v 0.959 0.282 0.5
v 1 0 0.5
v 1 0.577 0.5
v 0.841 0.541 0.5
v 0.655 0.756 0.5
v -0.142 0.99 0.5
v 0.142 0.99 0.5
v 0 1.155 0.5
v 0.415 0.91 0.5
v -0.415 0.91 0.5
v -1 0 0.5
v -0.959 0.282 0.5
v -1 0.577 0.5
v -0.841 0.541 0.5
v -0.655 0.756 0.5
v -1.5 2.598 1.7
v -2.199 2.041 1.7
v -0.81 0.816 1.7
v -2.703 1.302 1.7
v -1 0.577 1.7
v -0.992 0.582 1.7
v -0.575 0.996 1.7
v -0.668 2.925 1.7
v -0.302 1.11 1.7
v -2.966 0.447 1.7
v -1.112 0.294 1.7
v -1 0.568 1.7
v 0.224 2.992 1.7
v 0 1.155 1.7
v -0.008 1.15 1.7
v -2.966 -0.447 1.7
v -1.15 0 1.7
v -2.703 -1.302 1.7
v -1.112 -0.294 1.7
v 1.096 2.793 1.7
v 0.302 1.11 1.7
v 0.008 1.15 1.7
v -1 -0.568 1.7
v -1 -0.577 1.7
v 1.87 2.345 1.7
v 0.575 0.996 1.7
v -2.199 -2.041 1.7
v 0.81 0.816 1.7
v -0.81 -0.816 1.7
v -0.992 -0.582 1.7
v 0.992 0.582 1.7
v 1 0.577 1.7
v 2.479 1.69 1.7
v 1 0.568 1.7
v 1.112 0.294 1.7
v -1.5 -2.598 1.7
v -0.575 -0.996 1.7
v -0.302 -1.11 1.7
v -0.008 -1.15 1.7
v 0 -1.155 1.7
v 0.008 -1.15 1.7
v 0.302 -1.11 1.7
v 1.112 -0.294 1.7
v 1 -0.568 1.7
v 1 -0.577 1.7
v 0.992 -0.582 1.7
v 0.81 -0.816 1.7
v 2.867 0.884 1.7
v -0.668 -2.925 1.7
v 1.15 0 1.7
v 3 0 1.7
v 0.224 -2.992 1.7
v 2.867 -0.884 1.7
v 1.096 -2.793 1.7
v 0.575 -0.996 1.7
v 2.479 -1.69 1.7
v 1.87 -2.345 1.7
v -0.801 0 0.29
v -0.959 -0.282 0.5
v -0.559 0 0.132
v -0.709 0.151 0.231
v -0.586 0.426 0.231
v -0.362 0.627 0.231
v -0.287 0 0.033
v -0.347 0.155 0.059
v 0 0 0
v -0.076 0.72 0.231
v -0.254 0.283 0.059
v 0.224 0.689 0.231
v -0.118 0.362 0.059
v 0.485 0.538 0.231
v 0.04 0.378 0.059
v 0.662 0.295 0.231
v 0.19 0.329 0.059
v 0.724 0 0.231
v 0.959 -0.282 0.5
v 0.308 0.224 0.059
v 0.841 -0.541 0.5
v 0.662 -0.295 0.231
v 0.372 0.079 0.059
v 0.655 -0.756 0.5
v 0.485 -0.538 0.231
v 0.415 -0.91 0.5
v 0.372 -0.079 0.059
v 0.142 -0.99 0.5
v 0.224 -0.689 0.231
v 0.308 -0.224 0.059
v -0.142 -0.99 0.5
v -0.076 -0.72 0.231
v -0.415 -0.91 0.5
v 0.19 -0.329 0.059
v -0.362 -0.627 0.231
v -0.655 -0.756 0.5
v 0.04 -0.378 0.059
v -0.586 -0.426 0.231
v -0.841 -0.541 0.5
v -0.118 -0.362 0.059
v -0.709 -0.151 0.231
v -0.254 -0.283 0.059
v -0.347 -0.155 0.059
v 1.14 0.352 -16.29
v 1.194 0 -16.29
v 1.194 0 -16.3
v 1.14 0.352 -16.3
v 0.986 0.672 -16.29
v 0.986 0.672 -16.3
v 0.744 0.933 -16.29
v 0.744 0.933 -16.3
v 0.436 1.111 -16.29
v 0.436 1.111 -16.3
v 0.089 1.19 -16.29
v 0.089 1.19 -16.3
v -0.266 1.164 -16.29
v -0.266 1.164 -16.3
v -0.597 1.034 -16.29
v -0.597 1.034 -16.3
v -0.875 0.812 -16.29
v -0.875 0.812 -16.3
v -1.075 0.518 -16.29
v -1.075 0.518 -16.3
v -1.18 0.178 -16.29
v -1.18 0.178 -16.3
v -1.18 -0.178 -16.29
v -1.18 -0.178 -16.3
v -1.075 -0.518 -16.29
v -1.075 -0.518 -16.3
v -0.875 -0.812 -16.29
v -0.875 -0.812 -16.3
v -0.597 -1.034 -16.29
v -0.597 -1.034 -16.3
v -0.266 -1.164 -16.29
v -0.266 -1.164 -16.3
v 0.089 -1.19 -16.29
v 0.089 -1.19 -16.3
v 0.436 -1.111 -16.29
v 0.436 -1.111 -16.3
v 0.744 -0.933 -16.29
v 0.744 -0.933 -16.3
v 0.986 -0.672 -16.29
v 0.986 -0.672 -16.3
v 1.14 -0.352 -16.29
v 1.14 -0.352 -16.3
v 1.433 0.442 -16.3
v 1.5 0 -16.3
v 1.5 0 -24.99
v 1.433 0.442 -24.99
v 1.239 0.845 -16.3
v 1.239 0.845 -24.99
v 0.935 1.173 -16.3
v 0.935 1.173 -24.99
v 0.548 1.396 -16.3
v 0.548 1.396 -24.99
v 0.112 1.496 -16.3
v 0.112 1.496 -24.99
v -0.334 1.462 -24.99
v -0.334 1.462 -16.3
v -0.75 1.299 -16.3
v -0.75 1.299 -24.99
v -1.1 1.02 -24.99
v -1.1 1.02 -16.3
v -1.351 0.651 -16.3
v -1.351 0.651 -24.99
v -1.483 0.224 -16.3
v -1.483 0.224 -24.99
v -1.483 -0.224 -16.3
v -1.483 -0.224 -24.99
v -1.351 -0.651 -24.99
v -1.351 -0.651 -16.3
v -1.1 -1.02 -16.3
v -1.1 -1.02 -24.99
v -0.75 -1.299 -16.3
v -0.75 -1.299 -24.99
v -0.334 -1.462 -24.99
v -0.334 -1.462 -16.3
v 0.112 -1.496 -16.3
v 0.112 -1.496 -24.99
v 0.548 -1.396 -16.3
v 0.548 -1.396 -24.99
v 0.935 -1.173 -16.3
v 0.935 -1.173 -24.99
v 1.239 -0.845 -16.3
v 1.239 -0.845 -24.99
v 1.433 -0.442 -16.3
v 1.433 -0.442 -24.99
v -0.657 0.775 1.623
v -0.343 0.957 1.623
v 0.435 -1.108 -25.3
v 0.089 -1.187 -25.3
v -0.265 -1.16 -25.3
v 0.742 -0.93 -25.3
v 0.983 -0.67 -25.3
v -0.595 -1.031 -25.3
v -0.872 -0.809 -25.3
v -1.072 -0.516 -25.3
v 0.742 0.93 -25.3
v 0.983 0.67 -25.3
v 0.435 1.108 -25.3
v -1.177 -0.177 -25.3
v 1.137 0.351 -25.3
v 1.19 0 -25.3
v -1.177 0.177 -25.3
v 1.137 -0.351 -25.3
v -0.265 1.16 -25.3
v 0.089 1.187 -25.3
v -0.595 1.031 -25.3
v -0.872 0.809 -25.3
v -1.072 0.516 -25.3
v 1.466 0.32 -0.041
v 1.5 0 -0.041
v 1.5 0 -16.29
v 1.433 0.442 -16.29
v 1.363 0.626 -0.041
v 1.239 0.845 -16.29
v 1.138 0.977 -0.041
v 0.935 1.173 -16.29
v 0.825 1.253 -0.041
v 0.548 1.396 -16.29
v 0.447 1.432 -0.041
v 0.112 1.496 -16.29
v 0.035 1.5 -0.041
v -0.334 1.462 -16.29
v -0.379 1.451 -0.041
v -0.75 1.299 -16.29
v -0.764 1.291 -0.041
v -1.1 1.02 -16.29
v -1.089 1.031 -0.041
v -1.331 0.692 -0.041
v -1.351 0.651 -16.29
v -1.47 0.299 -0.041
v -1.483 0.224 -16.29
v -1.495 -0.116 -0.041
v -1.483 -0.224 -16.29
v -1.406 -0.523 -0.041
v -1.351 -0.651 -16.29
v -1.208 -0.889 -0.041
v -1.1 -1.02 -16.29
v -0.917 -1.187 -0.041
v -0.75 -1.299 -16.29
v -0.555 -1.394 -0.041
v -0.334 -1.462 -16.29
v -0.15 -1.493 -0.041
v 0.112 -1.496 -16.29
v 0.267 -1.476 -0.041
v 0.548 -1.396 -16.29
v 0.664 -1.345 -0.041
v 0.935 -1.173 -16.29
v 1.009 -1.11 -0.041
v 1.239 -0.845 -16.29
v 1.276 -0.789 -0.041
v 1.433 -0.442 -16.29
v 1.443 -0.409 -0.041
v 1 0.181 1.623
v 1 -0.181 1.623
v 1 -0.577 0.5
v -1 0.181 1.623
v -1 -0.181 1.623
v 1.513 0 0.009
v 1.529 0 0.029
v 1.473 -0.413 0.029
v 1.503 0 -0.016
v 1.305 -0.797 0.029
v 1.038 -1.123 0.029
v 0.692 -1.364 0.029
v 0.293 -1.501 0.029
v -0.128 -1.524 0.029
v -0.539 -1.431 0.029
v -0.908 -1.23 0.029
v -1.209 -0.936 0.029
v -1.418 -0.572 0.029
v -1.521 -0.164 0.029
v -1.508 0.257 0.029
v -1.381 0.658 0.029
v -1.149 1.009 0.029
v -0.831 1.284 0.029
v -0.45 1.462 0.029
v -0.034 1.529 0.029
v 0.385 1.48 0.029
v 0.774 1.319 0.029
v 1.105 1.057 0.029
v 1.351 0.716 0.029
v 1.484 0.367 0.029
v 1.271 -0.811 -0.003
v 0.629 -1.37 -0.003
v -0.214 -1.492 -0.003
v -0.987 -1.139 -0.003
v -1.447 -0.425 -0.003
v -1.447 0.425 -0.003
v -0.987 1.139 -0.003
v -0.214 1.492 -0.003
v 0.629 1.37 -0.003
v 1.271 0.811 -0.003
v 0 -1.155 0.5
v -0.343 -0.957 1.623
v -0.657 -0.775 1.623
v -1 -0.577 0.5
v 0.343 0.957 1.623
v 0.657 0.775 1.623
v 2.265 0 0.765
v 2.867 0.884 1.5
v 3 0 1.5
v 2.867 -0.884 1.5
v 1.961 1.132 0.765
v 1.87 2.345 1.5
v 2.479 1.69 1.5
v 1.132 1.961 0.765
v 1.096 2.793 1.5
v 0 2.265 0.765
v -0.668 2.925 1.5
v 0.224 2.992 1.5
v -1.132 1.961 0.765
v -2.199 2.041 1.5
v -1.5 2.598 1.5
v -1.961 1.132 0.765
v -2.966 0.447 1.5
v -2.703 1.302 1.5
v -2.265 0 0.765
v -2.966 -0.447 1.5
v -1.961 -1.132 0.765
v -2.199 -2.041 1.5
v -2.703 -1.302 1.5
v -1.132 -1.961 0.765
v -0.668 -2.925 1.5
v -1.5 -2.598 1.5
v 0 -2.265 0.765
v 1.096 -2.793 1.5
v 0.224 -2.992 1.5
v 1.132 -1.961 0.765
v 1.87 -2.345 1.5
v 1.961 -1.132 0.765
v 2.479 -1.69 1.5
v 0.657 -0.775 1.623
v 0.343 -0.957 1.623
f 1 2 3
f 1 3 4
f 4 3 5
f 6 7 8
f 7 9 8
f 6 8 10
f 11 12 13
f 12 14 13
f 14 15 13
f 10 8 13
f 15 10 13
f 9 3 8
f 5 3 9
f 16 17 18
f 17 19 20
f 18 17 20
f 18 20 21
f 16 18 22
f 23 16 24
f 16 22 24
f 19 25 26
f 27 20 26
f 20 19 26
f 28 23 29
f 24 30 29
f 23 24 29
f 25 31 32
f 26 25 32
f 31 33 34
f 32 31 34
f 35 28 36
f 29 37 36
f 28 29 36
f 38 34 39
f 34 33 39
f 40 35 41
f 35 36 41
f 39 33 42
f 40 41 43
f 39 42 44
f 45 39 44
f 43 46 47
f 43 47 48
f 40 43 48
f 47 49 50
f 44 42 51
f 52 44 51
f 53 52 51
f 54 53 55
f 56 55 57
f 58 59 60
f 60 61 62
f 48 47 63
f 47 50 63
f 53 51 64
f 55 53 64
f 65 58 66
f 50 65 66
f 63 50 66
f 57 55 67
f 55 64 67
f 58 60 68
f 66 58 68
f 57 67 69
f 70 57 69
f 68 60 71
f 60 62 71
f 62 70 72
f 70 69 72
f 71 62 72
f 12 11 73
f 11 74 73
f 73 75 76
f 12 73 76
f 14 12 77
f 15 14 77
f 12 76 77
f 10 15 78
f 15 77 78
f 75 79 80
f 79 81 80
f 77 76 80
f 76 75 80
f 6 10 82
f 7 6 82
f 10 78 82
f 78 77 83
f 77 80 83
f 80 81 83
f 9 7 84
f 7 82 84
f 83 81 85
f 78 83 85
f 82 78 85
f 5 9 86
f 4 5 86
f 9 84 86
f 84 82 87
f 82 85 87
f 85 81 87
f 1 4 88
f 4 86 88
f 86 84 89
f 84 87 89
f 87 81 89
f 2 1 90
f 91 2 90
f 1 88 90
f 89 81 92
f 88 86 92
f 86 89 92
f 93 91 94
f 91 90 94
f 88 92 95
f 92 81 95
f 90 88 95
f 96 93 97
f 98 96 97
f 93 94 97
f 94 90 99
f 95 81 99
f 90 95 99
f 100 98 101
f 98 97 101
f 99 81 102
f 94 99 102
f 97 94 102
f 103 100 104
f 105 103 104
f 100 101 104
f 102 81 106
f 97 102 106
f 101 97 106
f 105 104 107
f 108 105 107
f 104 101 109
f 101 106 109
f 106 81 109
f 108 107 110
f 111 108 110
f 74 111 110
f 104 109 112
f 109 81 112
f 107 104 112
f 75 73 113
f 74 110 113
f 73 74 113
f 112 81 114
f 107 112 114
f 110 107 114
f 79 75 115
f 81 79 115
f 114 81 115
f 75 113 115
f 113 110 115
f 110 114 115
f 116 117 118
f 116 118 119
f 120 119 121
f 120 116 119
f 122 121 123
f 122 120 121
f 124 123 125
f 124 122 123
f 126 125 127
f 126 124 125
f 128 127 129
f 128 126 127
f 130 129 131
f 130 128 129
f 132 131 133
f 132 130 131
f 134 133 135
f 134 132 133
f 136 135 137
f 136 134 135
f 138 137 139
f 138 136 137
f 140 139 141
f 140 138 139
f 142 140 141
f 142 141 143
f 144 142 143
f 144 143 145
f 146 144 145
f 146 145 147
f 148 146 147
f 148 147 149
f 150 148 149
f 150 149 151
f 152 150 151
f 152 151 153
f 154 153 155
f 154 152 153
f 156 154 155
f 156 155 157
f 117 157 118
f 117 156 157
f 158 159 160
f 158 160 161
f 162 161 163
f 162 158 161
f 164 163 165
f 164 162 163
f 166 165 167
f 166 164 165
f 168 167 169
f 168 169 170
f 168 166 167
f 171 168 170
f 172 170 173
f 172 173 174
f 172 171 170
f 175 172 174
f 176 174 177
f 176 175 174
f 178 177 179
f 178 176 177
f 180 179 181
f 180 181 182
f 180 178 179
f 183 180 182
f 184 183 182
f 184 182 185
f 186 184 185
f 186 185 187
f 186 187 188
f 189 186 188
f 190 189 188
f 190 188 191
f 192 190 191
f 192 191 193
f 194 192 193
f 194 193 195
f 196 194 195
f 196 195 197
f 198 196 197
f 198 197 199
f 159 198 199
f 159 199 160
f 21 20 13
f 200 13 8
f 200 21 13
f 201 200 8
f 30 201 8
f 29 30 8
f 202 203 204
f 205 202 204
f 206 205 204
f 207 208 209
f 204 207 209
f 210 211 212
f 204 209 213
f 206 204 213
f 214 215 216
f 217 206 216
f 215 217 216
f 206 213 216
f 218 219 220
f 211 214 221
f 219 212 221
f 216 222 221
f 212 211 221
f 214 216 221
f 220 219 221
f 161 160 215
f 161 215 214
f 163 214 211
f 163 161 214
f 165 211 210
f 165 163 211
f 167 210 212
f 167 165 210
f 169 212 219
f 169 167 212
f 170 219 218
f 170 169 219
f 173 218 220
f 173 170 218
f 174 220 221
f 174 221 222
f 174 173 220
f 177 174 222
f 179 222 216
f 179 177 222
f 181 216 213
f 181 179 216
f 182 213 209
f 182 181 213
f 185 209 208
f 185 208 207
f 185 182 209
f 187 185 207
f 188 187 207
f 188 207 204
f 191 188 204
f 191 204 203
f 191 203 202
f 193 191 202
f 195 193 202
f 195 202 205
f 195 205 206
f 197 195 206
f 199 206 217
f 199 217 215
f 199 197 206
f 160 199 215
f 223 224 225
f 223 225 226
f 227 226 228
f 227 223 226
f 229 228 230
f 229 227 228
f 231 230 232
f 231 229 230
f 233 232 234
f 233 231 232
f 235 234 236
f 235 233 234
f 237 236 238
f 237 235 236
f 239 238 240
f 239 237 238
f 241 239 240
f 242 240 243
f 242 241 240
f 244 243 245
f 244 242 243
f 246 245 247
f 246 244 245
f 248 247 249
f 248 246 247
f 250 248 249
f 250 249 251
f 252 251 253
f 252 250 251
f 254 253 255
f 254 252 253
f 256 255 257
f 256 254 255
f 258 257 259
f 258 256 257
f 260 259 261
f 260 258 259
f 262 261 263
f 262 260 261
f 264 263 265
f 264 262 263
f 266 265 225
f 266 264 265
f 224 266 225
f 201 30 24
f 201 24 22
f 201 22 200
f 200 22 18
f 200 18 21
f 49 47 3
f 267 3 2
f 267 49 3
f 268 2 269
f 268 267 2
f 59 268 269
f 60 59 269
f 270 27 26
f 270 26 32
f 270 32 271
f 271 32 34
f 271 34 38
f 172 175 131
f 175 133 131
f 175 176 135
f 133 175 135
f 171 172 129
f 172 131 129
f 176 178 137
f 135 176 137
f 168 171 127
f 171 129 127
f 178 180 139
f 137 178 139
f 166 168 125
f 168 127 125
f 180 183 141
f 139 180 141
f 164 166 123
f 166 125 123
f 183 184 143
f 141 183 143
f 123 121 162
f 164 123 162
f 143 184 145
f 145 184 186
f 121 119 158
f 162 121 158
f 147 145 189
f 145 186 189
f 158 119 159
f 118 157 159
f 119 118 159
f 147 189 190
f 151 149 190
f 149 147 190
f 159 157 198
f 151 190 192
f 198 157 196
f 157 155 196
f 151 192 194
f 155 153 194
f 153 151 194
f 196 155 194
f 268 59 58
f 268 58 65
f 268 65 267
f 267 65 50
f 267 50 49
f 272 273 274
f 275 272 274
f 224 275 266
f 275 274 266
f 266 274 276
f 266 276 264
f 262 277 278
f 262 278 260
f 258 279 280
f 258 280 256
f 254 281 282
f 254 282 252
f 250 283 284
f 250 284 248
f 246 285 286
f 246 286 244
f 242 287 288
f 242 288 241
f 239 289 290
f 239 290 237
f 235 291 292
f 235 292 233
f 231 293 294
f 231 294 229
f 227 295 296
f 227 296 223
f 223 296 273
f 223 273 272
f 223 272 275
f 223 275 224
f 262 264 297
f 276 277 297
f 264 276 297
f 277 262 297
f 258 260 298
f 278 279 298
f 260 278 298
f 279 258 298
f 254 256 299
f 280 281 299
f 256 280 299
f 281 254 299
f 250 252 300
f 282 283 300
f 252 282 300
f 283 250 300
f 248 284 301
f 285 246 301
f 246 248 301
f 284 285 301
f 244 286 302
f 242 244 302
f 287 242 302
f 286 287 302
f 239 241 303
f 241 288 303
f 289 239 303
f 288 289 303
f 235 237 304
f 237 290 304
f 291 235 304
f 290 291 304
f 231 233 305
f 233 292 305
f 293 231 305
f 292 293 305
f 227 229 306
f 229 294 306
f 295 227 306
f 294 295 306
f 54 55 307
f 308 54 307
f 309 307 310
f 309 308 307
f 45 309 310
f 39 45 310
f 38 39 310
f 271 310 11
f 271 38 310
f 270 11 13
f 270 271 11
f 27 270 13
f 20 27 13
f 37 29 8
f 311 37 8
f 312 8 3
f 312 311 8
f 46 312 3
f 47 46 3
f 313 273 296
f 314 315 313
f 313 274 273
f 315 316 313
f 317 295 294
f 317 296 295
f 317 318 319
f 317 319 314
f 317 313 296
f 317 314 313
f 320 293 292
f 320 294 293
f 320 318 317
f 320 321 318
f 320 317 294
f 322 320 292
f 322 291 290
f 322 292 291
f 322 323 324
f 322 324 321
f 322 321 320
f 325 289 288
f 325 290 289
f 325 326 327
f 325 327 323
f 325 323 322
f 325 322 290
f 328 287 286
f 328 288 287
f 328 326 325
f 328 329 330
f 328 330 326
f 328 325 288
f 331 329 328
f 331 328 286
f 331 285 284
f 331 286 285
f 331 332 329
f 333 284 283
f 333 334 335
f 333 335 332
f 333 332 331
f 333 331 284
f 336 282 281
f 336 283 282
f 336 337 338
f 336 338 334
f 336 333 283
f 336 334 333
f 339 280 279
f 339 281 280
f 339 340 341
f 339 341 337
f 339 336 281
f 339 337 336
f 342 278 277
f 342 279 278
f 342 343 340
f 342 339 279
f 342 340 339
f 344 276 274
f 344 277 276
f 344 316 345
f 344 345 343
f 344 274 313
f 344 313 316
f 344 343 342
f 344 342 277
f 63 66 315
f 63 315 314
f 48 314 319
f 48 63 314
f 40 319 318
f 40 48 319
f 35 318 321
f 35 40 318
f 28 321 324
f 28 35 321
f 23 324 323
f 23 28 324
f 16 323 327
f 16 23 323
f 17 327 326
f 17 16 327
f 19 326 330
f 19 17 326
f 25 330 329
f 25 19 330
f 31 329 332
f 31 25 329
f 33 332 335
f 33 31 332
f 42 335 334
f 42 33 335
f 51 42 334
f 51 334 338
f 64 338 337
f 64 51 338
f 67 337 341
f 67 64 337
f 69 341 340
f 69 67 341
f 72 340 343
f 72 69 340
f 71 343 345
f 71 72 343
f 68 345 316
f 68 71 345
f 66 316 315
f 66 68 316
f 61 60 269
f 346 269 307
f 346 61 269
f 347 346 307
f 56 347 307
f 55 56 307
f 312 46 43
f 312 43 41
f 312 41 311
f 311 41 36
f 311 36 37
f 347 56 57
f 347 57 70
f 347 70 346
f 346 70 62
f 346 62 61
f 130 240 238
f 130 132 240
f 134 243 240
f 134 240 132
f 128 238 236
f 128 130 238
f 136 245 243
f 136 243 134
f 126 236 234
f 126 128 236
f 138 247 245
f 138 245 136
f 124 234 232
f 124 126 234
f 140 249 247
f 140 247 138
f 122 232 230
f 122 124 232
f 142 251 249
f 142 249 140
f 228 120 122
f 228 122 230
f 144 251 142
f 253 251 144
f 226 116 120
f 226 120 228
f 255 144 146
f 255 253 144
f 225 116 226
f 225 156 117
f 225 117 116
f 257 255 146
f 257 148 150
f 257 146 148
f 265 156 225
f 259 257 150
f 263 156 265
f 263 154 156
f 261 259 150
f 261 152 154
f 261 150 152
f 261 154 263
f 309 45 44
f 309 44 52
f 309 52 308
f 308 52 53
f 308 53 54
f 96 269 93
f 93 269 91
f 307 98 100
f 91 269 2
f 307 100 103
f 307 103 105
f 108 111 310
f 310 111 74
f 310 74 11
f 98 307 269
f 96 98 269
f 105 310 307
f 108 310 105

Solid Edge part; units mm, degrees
sketch "Sketch1" plane through (0, 0, 0) normal (0, -1, 0) x (1, 0, 0)
  line L0 (1.5, 0) -> (3, 1.5)
  line L1 (3, 1.5) -> (3, 1.7)
  line L2 (3, 1.7) -> (0, 1.7)
  line L3 (0, 1.7) -> (0, -28.3)
  line L4 (0, -28.3) -> (1.1935, -28.3)
  line L5 (1.1935, -28.3) -> (1.5, -27.9935)
  line L6 (1.5, -27.9935) -> (1.5, -16.3)
  line L7 (1.5, -16.3) -> (1.1935, -16.3)
  line L8 (1.1935, -16.3) -> (1.1935, -16.29)
  line L9 (1.1935, -16.29) -> (1.5, -16.29)
  line L10 (1.5, -16.29) -> (1.5, 0)
  dimension "D1" = 3
  dimension "D2" = 1.7
  dimension "D3" = 0.01
  dimension "D4" = 1.1935
  dimension "D5" = 18
  dimension "D6" = 0.2
revolve "RevolvedProtrusion1" add sketch "Sketch1" angle 360 about axis through (0, 0, 54) along (0, 0, -1)
sketch "Sketch2" plane through (0, 0, 0) normal (0, -1, 0) x (1, 0, 0)
  arc A0 (-1, 0.5) -> (0, 0) centre (0, 1.25) ccw
  line L0 (0, 0.5) -> (0, 0)
  line L1 (-1, 0.5) -> (0, 0.5)
  dimension "D1" = 28.8
revolve "RevolvedCutout1" cut sketch "Sketch2" angle 360 about axis through (0, 0, 54) along (0, 0, -1)
sketch "Sketch3" plane through (0, 0, 1.7) normal (0, 0, 1) x (0, -1, 0)
  line L0 (-1.1547, 0) -> (-0.5774, 1)
  line L1 (-0.5774, 1) -> (0.5774, 1)
  line L2 (0.5774, 1) -> (1.1547, 0)
  line L3 (1.1547, 0) -> (0.5774, -1)
  line L4 (0.5774, -1) -> (-0.5774, -1)
  line L5 (-0.5774, -1) -> (-1.1547, 0)
  dimension "D1" = 2
extrude "Cutout1" cut sketch "Sketch3" against normal blind 1.2
cosmetic_thread "Thread1" size "M3"
sketch "Sketch4" plane through (0, 0, 0) normal (1, 0, 0) x (0, 1, 0)
  line L0 (-1.15, 1.7) -> (0, 1.036)
revolve "RevolvedCutout2" cut sketch "Sketch4" angle 360 about axis through (0, 0, -57) along (0, 0, 1) material side at (0, -0.55, 1.4113)
fillet "Round1" radius 0.1 1 edges at (-1.5, 0, 0)
sketch "Sketch5" plane through (0, 0, 0) normal (1, 0, 0) x (0, 1, 0)
  line L0 (-2.6438, -25.3) -> (2.8741, -25.3)
  dimension "D1" = 3
extrude "Extrusionsausschnitt_2" cut sketch "Sketch5" along normal mid plane 108.2201 material side at (0, 0.1151, -25.35)
chamfer "Fase_1" distance 0.31 angle 45 1 edges at (-1.5, 0, -25.3)
properties material "Stahl"
